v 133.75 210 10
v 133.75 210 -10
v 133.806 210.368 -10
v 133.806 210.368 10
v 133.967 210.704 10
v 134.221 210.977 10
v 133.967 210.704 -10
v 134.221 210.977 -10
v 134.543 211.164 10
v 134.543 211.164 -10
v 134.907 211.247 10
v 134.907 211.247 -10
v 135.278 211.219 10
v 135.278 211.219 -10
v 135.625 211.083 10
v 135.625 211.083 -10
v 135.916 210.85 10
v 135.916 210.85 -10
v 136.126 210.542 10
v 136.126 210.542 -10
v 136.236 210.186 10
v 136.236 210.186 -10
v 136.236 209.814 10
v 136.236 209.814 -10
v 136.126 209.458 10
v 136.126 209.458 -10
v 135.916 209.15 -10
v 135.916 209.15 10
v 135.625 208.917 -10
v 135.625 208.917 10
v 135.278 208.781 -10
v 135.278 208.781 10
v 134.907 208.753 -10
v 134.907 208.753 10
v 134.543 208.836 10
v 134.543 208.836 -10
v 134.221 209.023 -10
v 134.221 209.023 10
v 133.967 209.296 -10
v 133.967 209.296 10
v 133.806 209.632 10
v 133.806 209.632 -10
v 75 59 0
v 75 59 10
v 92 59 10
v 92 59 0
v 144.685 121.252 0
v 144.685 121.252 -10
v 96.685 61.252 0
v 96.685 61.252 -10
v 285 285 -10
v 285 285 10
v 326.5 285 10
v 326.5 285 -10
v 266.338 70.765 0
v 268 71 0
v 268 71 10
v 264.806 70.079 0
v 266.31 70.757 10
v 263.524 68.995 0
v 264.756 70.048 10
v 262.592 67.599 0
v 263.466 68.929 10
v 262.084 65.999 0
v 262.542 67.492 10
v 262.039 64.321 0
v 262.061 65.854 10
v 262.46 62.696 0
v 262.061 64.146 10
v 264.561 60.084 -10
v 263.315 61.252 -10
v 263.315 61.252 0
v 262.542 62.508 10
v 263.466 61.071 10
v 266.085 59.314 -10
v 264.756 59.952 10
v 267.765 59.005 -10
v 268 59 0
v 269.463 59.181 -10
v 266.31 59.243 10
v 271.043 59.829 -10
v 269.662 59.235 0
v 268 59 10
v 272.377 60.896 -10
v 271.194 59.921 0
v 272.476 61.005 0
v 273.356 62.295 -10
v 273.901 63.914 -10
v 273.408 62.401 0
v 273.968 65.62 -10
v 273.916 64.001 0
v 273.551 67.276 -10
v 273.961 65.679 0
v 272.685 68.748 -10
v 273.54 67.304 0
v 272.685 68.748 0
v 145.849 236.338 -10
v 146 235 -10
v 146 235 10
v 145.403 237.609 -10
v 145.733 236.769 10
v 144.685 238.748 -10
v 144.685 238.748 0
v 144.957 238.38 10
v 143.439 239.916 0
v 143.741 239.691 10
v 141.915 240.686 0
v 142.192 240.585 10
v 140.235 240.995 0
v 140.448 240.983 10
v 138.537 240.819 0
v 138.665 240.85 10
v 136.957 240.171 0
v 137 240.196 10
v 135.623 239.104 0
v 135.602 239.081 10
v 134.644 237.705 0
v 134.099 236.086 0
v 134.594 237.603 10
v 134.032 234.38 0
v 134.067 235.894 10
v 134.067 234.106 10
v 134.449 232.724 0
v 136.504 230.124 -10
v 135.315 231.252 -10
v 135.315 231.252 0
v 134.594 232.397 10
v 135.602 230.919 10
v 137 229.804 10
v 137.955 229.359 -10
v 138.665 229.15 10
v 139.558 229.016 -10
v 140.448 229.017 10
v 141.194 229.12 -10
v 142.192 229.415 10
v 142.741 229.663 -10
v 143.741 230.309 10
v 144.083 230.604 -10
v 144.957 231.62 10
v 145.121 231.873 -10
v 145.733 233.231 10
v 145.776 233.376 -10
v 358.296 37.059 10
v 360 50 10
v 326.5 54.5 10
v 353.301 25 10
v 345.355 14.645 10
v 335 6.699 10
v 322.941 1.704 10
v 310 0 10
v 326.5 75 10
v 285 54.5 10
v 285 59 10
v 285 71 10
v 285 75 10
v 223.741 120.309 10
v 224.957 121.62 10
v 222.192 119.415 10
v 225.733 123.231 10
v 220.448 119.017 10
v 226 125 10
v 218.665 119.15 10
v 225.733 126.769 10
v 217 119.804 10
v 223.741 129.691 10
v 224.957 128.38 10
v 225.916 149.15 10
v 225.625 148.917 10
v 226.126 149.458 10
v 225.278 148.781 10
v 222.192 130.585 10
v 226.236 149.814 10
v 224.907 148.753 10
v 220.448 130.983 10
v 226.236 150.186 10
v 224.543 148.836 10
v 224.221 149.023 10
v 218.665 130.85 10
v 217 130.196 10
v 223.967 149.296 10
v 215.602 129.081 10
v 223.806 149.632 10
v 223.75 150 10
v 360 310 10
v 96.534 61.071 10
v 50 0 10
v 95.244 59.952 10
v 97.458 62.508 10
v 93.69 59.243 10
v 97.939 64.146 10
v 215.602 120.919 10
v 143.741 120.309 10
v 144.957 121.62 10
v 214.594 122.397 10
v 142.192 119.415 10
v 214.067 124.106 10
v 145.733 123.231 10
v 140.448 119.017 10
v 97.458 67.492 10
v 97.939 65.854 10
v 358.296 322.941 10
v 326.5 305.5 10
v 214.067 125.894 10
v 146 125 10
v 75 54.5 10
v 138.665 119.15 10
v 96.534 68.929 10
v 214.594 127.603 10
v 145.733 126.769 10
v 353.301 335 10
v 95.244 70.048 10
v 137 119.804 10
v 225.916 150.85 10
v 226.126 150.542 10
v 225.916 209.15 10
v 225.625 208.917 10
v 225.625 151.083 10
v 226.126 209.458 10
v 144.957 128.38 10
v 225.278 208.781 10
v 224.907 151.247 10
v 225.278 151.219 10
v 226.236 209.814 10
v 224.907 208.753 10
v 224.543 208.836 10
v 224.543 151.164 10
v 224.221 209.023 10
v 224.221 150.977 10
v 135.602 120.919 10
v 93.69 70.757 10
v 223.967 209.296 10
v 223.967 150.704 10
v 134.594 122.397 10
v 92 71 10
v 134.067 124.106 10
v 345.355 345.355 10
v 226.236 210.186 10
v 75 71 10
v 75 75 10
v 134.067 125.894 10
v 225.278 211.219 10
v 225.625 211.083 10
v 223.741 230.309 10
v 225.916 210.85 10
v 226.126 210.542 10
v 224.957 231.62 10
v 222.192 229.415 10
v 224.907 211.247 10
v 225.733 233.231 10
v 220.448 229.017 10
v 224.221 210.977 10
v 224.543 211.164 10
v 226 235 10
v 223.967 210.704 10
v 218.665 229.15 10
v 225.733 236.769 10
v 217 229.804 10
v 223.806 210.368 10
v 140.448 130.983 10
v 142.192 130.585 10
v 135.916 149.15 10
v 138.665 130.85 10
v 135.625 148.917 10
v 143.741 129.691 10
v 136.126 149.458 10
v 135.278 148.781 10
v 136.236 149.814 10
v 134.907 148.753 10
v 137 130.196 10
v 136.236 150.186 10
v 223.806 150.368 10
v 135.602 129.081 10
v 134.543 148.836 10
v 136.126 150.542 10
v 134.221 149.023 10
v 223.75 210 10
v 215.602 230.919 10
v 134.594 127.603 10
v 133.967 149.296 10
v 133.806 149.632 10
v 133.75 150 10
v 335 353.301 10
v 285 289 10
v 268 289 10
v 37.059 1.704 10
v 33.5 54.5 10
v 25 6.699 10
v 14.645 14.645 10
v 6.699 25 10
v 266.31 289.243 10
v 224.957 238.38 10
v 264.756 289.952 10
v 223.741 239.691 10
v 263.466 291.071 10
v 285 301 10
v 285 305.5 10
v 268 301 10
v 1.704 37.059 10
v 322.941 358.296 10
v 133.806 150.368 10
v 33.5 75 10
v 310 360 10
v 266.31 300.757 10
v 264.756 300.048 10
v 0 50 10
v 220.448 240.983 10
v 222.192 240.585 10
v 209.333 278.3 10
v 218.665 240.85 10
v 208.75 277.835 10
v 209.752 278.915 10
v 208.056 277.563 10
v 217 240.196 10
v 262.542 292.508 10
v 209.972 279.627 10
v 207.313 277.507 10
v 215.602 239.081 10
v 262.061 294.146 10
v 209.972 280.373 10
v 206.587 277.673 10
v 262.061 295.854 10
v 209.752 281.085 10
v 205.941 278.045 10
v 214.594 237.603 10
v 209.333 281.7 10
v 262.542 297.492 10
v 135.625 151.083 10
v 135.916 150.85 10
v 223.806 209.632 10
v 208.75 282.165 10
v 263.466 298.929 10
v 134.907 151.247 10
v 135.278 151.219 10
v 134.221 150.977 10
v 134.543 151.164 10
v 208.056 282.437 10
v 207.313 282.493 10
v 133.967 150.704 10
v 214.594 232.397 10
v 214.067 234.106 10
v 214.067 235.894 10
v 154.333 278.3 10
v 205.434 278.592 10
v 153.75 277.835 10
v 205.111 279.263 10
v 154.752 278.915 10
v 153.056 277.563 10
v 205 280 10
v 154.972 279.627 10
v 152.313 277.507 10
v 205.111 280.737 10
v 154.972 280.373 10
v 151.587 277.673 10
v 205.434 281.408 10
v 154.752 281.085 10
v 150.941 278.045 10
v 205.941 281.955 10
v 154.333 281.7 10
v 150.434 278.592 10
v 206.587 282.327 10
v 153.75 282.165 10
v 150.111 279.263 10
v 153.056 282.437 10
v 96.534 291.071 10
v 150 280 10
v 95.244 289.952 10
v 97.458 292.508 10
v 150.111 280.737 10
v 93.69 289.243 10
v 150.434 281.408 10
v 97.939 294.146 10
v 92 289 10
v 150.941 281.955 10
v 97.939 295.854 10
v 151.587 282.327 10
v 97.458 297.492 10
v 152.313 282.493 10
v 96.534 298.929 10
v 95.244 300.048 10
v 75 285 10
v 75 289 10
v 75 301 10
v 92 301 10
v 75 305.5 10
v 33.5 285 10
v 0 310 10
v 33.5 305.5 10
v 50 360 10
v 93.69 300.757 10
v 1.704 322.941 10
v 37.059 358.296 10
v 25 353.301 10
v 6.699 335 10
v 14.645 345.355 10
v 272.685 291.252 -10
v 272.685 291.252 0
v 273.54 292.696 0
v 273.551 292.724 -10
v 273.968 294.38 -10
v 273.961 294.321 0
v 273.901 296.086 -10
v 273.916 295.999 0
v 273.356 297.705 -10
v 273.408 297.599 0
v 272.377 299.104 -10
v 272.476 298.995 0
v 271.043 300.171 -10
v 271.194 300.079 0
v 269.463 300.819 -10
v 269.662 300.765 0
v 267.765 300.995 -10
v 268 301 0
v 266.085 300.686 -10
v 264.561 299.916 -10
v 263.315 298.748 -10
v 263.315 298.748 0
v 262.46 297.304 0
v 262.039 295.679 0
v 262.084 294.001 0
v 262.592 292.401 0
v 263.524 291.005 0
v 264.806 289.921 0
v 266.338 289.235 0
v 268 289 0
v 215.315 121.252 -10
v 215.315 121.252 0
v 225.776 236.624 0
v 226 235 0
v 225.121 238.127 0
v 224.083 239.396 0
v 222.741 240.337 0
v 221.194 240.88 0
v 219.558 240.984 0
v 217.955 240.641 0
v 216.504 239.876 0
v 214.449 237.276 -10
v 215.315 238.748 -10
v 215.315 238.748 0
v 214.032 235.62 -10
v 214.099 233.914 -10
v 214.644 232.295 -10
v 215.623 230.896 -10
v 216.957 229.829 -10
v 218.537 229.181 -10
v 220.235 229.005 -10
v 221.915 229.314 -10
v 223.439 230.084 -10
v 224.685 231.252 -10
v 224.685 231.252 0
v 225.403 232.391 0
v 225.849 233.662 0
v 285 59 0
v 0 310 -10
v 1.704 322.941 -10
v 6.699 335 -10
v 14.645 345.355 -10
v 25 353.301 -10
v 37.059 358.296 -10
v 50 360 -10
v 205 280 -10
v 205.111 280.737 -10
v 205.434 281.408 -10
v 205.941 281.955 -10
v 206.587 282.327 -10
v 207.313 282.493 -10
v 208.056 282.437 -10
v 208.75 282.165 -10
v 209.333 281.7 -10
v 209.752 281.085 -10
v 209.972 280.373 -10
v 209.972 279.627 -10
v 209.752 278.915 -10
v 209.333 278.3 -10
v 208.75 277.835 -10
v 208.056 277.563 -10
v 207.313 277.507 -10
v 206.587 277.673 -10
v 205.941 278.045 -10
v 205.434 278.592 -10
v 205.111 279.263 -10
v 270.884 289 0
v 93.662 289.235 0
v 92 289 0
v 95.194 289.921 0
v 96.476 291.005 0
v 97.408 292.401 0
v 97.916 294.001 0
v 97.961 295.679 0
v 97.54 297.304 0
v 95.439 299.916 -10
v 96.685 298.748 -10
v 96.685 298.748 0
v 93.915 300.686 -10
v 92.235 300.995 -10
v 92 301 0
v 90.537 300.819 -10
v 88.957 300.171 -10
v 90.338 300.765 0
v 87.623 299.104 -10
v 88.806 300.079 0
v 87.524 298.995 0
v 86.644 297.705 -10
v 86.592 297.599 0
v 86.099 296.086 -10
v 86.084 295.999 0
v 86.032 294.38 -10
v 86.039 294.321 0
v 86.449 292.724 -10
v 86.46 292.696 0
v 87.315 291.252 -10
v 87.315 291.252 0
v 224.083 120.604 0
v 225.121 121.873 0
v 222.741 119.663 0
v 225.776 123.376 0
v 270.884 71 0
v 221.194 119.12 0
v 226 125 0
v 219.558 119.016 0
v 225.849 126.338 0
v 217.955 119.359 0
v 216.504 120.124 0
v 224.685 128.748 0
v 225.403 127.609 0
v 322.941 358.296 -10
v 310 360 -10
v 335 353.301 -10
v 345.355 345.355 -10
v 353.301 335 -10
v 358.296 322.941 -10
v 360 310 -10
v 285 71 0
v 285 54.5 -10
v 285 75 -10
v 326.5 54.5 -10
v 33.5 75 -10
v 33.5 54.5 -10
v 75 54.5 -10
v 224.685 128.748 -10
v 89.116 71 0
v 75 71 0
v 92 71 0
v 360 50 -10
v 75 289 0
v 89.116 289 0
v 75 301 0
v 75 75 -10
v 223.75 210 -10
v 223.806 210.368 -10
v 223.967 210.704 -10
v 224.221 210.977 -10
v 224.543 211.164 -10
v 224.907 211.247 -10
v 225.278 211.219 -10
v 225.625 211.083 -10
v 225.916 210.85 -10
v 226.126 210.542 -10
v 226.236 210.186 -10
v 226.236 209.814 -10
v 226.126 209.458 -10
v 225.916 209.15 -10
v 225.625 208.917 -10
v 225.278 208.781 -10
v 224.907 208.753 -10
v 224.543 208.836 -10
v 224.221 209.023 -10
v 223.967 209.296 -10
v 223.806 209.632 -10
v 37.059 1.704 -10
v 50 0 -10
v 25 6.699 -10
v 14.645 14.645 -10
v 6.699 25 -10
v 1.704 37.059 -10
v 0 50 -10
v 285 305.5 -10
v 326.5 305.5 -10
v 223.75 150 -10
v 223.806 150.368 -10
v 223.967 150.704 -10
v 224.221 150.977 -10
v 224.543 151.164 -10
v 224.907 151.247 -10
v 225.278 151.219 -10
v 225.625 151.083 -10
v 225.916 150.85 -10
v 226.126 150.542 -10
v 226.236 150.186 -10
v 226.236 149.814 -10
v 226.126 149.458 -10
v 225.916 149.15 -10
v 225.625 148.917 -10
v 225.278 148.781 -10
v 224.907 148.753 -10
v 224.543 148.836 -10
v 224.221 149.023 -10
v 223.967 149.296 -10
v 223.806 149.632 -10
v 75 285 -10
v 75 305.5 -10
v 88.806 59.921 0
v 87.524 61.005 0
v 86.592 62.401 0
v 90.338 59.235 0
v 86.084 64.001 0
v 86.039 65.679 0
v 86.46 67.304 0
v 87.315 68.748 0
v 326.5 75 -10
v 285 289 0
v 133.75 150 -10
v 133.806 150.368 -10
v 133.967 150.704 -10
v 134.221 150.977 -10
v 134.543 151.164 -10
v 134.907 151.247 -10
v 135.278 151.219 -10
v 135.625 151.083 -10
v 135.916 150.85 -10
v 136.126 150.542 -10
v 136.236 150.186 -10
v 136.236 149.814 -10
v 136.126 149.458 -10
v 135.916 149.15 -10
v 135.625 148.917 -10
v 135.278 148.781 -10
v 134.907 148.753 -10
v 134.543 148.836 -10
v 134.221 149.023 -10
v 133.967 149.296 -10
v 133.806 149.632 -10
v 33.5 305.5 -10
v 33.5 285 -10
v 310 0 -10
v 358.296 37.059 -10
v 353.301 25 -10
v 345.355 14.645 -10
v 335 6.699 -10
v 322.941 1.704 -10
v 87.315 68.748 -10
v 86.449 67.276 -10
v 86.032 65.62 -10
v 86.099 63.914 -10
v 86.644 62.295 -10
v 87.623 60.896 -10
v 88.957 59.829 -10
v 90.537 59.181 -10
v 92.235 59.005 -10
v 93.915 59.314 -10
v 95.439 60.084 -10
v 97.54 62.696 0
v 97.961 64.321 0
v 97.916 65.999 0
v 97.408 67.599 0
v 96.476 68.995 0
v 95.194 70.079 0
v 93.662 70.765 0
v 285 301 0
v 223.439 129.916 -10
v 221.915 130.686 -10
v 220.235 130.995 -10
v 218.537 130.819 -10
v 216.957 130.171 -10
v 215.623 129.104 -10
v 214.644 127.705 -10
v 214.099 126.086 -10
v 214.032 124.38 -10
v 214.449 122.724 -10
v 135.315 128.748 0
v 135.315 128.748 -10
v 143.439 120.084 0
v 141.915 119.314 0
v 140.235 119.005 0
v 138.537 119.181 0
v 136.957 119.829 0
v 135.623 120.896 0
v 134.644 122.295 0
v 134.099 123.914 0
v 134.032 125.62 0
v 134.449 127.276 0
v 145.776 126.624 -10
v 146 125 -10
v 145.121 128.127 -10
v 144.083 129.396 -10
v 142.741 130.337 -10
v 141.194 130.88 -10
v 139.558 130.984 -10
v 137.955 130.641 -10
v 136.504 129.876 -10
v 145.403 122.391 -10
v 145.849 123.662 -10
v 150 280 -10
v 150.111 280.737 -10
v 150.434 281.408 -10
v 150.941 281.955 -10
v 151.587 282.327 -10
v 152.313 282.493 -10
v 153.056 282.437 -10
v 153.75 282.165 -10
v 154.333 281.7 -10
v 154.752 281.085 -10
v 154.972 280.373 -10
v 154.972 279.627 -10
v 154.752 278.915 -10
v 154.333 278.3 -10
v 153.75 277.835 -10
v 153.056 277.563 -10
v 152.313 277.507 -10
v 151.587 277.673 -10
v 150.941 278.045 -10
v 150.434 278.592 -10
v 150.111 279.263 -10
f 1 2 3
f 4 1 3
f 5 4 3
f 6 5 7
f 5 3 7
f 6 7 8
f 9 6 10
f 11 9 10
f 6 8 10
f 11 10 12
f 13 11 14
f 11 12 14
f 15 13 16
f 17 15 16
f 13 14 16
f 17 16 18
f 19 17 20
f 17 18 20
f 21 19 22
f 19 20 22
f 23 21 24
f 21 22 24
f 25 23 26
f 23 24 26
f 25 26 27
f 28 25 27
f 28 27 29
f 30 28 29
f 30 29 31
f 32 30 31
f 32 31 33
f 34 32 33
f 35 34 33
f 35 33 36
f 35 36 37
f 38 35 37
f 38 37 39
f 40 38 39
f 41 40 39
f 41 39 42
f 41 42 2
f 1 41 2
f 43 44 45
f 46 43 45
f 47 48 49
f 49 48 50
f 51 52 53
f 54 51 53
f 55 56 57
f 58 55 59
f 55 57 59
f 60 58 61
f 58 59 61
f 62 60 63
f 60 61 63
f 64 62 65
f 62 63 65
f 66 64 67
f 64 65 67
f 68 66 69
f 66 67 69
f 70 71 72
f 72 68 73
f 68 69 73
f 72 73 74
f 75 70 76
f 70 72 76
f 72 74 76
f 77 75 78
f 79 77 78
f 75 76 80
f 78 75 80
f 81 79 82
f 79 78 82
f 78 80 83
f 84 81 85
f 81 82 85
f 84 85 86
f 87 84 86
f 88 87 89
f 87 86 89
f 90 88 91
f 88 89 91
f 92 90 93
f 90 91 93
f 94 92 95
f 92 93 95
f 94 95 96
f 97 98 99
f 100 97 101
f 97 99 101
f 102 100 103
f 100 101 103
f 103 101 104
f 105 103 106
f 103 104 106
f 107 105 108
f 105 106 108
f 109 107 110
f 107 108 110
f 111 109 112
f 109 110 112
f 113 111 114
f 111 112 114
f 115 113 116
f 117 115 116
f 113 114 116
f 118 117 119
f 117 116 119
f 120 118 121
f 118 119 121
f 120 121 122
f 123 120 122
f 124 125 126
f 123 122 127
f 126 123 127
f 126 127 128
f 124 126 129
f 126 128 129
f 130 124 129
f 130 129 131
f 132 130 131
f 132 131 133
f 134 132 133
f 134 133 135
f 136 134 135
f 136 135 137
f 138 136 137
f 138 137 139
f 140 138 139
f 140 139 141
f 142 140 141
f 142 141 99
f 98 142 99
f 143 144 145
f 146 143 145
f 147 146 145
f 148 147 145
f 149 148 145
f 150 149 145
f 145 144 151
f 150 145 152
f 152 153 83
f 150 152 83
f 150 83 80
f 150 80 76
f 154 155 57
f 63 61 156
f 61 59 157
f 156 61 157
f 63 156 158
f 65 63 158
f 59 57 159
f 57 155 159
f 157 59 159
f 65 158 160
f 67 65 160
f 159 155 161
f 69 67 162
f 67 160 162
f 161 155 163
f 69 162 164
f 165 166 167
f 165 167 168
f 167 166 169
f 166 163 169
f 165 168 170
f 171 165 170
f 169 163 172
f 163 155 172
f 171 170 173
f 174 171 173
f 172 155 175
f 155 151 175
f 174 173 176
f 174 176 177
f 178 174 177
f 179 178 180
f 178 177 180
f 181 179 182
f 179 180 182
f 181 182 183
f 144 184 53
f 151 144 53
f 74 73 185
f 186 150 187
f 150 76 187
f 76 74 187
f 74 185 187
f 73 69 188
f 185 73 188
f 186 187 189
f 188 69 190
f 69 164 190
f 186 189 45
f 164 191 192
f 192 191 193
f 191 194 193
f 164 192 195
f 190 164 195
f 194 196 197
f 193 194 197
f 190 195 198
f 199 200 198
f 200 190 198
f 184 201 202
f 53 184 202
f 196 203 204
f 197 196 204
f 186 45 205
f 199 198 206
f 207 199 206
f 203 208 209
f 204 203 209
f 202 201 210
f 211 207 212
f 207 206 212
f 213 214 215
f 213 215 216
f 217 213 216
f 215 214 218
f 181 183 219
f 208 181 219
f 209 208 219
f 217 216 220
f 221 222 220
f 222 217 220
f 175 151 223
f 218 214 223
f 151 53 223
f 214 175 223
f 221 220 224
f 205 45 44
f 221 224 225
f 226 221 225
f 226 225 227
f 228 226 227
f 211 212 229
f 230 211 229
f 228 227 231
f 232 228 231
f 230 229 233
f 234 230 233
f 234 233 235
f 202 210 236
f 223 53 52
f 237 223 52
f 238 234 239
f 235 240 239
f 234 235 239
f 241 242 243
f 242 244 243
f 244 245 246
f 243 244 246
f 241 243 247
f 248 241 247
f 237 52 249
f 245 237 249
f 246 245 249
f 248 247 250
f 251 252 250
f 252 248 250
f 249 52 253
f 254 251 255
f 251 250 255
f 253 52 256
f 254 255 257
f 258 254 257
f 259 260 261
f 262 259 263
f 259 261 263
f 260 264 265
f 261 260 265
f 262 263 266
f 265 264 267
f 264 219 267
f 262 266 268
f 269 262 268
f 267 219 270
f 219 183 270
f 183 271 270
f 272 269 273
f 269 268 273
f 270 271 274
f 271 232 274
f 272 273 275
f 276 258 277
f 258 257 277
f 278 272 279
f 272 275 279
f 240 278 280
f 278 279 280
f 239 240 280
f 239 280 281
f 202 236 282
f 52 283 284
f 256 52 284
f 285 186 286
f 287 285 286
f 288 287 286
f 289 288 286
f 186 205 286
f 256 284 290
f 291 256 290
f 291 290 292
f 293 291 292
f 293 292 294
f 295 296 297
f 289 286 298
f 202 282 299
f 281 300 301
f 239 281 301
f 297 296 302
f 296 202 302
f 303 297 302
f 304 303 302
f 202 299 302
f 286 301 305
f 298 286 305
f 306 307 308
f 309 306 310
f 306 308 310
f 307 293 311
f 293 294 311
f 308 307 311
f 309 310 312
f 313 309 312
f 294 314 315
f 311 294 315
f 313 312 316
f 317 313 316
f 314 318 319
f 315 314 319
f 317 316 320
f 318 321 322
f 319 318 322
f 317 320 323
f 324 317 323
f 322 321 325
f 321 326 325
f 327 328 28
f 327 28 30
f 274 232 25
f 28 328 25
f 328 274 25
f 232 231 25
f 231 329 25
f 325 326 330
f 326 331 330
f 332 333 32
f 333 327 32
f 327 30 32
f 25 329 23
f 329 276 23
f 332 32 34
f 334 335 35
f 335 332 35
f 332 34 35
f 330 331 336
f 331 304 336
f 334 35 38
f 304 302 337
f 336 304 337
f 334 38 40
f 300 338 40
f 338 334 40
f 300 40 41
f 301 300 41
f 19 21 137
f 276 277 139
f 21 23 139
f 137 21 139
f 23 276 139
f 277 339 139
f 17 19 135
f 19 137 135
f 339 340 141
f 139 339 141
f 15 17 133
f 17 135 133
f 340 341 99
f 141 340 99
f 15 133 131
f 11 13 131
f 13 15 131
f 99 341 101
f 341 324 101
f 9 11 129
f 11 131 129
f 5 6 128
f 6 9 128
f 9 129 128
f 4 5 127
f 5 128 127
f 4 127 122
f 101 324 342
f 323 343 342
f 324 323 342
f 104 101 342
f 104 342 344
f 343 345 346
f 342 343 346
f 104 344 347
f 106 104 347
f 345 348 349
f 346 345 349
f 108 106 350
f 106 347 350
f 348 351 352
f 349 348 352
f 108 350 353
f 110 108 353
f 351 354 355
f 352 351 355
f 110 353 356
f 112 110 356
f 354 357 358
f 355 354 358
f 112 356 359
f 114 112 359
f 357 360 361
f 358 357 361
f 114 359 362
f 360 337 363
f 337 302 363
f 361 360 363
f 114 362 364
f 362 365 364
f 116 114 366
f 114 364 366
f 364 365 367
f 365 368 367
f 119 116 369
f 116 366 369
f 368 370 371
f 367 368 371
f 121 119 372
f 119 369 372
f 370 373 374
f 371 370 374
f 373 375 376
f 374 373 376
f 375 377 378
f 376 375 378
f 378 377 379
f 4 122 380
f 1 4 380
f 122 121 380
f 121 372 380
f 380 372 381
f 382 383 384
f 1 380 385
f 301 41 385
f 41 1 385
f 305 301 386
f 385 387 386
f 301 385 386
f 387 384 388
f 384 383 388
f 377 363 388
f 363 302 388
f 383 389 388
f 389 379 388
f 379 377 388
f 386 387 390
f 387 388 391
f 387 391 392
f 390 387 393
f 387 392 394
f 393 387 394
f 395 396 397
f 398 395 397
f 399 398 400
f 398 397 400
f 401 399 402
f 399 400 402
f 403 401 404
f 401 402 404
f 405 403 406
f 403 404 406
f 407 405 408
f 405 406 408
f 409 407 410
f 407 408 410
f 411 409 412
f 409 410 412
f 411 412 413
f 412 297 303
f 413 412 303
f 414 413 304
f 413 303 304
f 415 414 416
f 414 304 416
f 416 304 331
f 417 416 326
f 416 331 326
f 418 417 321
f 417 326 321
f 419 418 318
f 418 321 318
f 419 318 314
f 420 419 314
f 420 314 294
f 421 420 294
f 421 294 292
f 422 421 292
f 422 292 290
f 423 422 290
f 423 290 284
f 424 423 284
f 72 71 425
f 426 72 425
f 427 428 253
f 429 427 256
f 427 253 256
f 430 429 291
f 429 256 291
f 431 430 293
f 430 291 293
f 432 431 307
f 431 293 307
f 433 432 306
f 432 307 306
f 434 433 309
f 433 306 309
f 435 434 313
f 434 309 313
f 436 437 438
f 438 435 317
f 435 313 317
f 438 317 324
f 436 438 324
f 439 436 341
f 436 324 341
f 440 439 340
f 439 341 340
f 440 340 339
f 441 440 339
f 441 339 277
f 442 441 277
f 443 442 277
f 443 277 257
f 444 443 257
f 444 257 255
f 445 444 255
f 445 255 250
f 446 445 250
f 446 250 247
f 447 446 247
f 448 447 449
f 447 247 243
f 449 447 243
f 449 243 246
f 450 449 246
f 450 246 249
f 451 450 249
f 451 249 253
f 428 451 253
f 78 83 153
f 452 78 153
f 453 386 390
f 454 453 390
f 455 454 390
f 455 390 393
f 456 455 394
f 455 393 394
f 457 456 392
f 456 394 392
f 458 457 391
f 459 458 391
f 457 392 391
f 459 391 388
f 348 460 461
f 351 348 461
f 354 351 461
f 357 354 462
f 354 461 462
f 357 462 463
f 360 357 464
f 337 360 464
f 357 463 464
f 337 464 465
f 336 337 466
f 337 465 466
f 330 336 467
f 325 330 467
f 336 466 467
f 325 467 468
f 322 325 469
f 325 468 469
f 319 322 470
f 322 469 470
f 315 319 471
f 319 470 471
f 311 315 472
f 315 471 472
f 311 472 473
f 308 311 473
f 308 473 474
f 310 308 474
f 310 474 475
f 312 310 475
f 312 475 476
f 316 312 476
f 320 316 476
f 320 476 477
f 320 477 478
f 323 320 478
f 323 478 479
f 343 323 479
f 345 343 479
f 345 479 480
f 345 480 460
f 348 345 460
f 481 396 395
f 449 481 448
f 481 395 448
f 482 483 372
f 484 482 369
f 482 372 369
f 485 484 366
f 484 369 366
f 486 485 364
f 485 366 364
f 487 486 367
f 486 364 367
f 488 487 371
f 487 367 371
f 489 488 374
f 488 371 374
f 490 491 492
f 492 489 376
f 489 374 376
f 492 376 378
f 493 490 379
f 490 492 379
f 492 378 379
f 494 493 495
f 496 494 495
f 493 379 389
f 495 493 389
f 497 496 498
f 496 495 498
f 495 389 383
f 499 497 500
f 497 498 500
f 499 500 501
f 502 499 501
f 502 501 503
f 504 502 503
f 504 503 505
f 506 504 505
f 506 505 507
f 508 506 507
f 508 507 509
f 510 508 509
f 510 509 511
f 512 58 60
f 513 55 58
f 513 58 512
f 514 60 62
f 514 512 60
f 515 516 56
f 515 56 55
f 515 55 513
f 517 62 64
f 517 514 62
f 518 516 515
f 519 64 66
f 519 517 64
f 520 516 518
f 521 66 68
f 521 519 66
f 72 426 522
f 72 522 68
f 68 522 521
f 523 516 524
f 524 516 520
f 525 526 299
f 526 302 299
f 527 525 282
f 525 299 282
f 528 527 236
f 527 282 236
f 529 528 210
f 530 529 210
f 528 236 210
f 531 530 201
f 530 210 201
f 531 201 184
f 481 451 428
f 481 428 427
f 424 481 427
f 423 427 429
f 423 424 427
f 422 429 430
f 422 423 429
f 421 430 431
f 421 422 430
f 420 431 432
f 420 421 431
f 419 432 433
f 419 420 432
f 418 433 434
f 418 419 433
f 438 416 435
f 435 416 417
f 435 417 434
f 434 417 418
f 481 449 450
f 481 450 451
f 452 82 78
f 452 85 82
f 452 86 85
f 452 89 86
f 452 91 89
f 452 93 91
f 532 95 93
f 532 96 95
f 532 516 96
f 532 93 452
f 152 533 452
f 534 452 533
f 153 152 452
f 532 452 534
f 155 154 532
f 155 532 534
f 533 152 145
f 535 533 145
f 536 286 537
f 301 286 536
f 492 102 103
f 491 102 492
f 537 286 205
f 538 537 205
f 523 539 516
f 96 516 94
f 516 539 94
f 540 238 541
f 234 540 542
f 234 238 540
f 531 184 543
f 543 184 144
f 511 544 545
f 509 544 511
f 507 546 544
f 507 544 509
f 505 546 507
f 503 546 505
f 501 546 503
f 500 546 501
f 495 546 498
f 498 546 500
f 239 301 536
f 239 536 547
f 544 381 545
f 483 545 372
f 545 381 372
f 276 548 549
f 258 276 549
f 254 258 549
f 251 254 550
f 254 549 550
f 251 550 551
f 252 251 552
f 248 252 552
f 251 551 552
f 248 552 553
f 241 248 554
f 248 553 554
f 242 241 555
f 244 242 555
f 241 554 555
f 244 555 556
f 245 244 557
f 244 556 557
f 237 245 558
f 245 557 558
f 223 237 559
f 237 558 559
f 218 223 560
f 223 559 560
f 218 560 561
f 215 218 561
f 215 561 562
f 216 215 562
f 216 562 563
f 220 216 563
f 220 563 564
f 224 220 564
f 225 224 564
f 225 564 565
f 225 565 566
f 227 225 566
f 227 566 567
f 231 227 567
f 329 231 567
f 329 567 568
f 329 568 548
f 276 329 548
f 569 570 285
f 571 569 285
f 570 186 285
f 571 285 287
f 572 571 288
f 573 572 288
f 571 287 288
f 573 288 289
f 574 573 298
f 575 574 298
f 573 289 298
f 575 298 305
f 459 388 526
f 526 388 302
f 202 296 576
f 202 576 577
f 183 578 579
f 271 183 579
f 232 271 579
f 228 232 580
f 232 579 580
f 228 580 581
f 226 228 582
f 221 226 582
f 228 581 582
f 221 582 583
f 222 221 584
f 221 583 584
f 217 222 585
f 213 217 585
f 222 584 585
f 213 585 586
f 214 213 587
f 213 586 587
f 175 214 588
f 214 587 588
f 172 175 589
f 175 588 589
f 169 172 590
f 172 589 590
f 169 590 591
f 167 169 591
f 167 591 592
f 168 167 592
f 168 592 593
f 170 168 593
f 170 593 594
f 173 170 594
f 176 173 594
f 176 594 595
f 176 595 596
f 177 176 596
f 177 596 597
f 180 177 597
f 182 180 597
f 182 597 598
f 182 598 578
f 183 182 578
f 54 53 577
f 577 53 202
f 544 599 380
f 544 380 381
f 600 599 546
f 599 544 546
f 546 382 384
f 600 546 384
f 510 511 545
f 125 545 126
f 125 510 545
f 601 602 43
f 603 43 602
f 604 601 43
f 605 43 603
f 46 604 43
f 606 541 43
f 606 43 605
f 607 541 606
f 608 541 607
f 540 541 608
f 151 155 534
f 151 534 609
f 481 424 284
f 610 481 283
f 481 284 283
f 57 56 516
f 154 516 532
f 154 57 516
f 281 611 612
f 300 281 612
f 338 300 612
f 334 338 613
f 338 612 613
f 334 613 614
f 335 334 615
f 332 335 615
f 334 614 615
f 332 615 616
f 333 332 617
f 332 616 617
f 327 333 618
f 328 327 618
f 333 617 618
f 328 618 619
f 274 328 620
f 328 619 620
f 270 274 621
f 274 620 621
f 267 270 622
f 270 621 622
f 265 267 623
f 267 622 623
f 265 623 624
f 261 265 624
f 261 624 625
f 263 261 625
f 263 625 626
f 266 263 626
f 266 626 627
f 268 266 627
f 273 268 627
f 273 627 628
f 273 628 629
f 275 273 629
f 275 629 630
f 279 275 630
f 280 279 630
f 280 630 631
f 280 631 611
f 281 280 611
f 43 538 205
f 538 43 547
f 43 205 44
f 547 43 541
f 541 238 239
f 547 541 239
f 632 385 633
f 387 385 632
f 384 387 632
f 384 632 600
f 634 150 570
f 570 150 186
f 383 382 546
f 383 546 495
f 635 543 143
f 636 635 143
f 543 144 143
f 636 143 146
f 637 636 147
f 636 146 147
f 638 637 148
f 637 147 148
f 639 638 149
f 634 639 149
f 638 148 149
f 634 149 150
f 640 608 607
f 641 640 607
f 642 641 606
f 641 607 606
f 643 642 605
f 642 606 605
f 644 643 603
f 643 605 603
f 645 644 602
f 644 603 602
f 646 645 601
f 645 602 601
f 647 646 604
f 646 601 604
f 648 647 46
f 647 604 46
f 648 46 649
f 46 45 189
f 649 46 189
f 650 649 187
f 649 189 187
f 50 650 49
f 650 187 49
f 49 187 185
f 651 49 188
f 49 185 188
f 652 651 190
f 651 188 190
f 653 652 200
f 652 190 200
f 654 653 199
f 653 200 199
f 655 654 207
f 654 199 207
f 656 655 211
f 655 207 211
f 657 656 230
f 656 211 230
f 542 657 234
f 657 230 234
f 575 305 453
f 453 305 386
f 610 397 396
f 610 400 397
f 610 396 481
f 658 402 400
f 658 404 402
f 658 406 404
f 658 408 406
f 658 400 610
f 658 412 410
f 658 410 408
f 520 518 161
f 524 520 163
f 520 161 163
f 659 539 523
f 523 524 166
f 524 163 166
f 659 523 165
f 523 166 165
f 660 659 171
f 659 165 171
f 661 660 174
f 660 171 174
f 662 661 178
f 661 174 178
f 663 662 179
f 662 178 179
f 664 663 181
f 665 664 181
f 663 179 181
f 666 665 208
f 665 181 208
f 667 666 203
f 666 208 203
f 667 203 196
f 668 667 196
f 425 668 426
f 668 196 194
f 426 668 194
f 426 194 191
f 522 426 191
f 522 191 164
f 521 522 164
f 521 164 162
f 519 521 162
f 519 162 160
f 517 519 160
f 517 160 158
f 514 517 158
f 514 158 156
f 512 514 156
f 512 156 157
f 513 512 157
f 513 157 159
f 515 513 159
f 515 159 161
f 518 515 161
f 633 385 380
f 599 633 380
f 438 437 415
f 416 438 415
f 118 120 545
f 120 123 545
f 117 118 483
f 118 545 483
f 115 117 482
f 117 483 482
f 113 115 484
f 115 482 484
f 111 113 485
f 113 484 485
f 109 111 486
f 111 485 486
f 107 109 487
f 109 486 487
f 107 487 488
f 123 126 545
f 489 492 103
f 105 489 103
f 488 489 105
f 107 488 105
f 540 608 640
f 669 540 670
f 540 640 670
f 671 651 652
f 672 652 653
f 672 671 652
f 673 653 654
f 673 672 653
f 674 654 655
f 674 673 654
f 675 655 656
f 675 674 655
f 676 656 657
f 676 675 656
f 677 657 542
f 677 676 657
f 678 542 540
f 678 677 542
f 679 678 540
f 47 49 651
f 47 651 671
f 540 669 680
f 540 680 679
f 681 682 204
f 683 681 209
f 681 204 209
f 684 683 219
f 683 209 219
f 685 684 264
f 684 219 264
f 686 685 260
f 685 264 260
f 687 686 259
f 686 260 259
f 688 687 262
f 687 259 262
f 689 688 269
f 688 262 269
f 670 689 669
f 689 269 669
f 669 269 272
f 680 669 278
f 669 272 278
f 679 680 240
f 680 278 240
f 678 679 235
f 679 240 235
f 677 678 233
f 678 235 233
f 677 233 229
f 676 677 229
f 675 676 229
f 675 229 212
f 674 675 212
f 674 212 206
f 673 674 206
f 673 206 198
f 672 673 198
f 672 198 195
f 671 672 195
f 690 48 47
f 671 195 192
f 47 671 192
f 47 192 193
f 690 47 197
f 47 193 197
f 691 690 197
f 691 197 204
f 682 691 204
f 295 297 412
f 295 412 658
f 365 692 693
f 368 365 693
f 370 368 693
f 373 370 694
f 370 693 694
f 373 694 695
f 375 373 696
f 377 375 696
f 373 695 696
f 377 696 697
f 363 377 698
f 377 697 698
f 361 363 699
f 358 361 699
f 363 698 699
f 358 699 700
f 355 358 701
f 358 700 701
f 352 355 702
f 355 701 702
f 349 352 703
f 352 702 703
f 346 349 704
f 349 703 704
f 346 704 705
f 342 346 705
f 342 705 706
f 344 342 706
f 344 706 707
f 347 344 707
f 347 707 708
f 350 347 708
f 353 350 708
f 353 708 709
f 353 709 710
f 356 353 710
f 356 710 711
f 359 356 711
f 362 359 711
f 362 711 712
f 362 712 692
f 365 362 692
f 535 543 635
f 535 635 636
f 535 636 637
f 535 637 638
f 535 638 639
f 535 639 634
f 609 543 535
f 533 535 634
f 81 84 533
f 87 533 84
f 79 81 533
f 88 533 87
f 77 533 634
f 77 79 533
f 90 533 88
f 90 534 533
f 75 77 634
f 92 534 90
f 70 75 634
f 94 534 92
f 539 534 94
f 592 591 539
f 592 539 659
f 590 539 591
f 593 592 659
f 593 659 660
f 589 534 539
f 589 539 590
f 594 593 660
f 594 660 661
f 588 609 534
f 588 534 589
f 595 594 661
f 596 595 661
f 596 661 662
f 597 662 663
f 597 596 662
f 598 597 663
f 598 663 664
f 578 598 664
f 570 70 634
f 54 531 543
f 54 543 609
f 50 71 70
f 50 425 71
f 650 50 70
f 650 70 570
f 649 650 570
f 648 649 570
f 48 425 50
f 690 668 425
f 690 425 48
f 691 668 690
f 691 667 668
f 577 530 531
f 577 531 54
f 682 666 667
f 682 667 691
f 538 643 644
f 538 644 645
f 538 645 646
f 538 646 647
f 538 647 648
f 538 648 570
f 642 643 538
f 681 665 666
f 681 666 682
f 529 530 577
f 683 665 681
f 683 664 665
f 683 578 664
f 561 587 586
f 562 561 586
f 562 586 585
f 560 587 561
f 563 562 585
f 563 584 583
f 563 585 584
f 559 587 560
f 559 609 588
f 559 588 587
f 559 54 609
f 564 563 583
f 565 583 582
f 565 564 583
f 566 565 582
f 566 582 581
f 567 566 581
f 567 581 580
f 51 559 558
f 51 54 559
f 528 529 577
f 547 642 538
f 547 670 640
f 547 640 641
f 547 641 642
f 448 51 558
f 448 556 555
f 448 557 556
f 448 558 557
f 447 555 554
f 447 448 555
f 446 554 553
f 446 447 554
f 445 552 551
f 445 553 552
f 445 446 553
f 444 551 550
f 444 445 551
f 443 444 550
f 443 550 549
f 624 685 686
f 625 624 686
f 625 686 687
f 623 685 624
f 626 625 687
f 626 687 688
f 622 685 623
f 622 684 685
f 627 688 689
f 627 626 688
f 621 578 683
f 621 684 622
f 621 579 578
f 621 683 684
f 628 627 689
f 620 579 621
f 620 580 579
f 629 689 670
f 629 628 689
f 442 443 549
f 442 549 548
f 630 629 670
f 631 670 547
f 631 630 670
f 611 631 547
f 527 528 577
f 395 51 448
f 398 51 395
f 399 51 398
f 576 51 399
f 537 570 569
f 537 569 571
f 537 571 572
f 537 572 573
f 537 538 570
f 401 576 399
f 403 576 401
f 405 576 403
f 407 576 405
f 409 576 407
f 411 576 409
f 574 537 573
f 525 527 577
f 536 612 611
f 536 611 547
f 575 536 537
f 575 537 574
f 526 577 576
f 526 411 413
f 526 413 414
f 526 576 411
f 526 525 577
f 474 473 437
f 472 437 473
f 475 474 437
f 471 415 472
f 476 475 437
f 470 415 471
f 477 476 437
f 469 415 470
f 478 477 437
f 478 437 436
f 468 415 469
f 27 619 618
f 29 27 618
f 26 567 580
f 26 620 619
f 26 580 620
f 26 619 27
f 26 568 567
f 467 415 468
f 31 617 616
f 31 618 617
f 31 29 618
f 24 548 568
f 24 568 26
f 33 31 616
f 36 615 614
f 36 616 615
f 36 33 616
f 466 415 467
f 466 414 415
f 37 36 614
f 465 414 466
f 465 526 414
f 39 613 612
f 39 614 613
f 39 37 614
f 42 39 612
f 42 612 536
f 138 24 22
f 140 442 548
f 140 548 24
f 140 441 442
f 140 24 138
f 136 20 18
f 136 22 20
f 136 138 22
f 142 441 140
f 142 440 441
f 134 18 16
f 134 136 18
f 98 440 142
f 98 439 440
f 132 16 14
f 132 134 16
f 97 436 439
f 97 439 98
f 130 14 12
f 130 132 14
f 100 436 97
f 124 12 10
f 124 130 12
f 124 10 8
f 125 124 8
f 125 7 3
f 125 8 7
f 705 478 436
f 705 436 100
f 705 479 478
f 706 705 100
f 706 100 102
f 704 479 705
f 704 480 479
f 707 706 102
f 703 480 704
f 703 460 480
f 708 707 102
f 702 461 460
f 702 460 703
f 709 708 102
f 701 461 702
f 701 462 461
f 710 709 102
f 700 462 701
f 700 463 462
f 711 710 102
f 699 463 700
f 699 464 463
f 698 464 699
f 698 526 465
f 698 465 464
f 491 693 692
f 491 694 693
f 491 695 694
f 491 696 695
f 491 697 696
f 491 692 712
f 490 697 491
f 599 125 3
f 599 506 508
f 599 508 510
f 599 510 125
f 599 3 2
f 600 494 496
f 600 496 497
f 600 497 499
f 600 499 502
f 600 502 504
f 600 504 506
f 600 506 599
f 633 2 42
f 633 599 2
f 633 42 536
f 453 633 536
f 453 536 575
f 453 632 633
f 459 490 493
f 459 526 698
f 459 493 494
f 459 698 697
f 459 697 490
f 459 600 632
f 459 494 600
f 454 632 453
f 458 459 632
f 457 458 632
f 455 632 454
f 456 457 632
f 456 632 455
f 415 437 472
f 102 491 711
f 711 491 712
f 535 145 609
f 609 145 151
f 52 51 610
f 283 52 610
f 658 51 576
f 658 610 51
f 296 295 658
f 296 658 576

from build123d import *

# Parameters (mm, degrees)
BOSS_EXTRUDE1_DEPTH = 10
SKETCH2_W           = 41.5
SKETCH2_H           = 20.5
CUT_EXTRUDE1_DEPTH  = 20
SKETCH3_R           = 6
CUT_EXTRUDE2_DEPTH  = 510.509568114
SKETCH4_R           = 6
CUT_EXTRUDE3_DEPTH  = 510.509568114
CUT_EXTRUDE4_DEPTH  = 10
SKETCH11_W          = 20.354372897
SKETCH11_H          = 12
SKETCH11_W_2        = 24.350914836
SKETCH11_W_3        = 29.997295682
CUT_EXTRUDE5_DEPTH  = 10
M3_TAPPED_HOLE1_D   = 2.5
M6_TAPPED_HOLE1_D   = 5


with BuildPart() as part:
    # Sketch1 → Boss-Extrude1 (new, symmetric)
    with BuildSketch(Plane.XY):
        with BuildLine():
            Line((50, 360), (310, 360))
            ThreePointArc((310, 360), (345.355339059, 345.355339059), (360, 310))
            Line((360, 310), (360, 50))
            ThreePointArc((360, 50), (345.355339059, 14.644660941), (310, 0))
            Line((310, 0), (50, 0))
            ThreePointArc((50, 0), (14.644660941, 14.644660941), (0, 50))
            Line((0, 50), (0, 310))
            ThreePointArc((0, 310), (14.644660941, 345.355339059), (50, 360))
        make_face()
    extrude(amount=BOSS_EXTRUDE1_DEPTH, both=True)

    # Sketch2 → Cut-Extrude1 (cut)
    with BuildSketch(Plane.XY.offset(10)):
        with Locations((54.25, 295.25)):
            Rectangle(SKETCH2_W, SKETCH2_H)
        with Locations((305.75, 295.25)):
            Rectangle(SKETCH2_W, SKETCH2_H)
        with Locations((305.75, 64.75)):
            Rectangle(SKETCH2_W, SKETCH2_H)
        with Locations((54.25, 64.75)):
            Rectangle(SKETCH2_W, SKETCH2_H)
    extrude(amount=-CUT_EXTRUDE1_DEPTH, mode=Mode.SUBTRACT)

    # Sketch3 → Cut-Extrude2 (cut, through all)
    with BuildSketch(Plane.XY.offset(10)):
        with Locations((92, 295)):
            Circle(SKETCH3_R)
        with Locations((268, 295)):
            Circle(SKETCH3_R)
        with Locations((268, 65)):
            Circle(SKETCH3_R)
        with Locations((92, 65)):
            Circle(SKETCH3_R)
    extrude(amount=-CUT_EXTRUDE2_DEPTH, mode=Mode.SUBTRACT)

    # Sketch4 → Cut-Extrude3 (cut, through all)
    with BuildSketch(Plane.XY.offset(10)):
        with Locations((140, 235)):
            Circle(SKETCH4_R)
        with Locations((220, 235)):
            Circle(SKETCH4_R)
        with Locations((220, 125)):
            Circle(SKETCH4_R)
        with Locations((140, 125)):
            Circle(SKETCH4_R)
    extrude(amount=-CUT_EXTRUDE3_DEPTH, mode=Mode.SUBTRACT)

    # Sketch10 → Cut-Extrude4 (cut)
    with BuildSketch(Plane(origin=(0, 0, -10), x_dir=(-1, 0, 0), z_dir=(0, 0, -1))):
        Polygon((-87.314787143, 291.251829715), (-135.314787143, 231.251829715), (-144.685212857, 238.748170285), (-96.685212857, 298.748170285), align=None)
        Polygon((-263.314787143, 61.251829715), (-215.314787143, 121.251829715), (-224.685212857, 128.748170285), (-272.685212857, 68.748170285), align=None)
        Polygon((-87.314787143, 68.748170285), (-135.314787143, 128.748170285), (-144.685212857, 121.251829715), (-96.685212857, 61.251829715), align=None)
        Polygon((-272.685212857, 291.251829715), (-224.685212857, 231.251829715), (-215.314787143, 238.748170285), (-263.314787143, 298.748170285), align=None)
    extrude(amount=-CUT_EXTRUDE4_DEPTH, mode=Mode.SUBTRACT)

    # Sketch11 → Cut-Extrude5 (cut)
    with BuildSketch(Plane.XY.offset(10)):
        with Locations((81.822813552, 65)):
            Rectangle(SKETCH11_W, SKETCH11_H)
        with Locations((280.175457418, 65)):
            Rectangle(SKETCH11_W_2, SKETCH11_H)
        with Locations((280.175457418, 295)):
            Rectangle(SKETCH11_W_2, SKETCH11_H)
        with Locations((77.001352159, 295)):
            Rectangle(SKETCH11_W_3, SKETCH11_H)
    extrude(amount=-CUT_EXTRUDE5_DEPTH, mode=Mode.SUBTRACT)

    # M3 Tapped Hole1 (through all)
    with Locations(Plane(origin=(135, 150, 10), x_dir=(1, 0, 0), z_dir=(0, 0, 1))):
        with Locations((0, 0), (90, 60), (0, 60), (90, 0)):
            Hole(M3_TAPPED_HOLE1_D / 2)

    # M6 Tapped Hole1 (through all)
    with Locations(Plane(origin=(152.5, 280, 10), x_dir=(1, 0, 0), z_dir=(0, 0, 1))):
        with Locations((0, 0), (55, 0)):
            Hole(M6_TAPPED_HOLE1_D / 2)


solid = part.part
